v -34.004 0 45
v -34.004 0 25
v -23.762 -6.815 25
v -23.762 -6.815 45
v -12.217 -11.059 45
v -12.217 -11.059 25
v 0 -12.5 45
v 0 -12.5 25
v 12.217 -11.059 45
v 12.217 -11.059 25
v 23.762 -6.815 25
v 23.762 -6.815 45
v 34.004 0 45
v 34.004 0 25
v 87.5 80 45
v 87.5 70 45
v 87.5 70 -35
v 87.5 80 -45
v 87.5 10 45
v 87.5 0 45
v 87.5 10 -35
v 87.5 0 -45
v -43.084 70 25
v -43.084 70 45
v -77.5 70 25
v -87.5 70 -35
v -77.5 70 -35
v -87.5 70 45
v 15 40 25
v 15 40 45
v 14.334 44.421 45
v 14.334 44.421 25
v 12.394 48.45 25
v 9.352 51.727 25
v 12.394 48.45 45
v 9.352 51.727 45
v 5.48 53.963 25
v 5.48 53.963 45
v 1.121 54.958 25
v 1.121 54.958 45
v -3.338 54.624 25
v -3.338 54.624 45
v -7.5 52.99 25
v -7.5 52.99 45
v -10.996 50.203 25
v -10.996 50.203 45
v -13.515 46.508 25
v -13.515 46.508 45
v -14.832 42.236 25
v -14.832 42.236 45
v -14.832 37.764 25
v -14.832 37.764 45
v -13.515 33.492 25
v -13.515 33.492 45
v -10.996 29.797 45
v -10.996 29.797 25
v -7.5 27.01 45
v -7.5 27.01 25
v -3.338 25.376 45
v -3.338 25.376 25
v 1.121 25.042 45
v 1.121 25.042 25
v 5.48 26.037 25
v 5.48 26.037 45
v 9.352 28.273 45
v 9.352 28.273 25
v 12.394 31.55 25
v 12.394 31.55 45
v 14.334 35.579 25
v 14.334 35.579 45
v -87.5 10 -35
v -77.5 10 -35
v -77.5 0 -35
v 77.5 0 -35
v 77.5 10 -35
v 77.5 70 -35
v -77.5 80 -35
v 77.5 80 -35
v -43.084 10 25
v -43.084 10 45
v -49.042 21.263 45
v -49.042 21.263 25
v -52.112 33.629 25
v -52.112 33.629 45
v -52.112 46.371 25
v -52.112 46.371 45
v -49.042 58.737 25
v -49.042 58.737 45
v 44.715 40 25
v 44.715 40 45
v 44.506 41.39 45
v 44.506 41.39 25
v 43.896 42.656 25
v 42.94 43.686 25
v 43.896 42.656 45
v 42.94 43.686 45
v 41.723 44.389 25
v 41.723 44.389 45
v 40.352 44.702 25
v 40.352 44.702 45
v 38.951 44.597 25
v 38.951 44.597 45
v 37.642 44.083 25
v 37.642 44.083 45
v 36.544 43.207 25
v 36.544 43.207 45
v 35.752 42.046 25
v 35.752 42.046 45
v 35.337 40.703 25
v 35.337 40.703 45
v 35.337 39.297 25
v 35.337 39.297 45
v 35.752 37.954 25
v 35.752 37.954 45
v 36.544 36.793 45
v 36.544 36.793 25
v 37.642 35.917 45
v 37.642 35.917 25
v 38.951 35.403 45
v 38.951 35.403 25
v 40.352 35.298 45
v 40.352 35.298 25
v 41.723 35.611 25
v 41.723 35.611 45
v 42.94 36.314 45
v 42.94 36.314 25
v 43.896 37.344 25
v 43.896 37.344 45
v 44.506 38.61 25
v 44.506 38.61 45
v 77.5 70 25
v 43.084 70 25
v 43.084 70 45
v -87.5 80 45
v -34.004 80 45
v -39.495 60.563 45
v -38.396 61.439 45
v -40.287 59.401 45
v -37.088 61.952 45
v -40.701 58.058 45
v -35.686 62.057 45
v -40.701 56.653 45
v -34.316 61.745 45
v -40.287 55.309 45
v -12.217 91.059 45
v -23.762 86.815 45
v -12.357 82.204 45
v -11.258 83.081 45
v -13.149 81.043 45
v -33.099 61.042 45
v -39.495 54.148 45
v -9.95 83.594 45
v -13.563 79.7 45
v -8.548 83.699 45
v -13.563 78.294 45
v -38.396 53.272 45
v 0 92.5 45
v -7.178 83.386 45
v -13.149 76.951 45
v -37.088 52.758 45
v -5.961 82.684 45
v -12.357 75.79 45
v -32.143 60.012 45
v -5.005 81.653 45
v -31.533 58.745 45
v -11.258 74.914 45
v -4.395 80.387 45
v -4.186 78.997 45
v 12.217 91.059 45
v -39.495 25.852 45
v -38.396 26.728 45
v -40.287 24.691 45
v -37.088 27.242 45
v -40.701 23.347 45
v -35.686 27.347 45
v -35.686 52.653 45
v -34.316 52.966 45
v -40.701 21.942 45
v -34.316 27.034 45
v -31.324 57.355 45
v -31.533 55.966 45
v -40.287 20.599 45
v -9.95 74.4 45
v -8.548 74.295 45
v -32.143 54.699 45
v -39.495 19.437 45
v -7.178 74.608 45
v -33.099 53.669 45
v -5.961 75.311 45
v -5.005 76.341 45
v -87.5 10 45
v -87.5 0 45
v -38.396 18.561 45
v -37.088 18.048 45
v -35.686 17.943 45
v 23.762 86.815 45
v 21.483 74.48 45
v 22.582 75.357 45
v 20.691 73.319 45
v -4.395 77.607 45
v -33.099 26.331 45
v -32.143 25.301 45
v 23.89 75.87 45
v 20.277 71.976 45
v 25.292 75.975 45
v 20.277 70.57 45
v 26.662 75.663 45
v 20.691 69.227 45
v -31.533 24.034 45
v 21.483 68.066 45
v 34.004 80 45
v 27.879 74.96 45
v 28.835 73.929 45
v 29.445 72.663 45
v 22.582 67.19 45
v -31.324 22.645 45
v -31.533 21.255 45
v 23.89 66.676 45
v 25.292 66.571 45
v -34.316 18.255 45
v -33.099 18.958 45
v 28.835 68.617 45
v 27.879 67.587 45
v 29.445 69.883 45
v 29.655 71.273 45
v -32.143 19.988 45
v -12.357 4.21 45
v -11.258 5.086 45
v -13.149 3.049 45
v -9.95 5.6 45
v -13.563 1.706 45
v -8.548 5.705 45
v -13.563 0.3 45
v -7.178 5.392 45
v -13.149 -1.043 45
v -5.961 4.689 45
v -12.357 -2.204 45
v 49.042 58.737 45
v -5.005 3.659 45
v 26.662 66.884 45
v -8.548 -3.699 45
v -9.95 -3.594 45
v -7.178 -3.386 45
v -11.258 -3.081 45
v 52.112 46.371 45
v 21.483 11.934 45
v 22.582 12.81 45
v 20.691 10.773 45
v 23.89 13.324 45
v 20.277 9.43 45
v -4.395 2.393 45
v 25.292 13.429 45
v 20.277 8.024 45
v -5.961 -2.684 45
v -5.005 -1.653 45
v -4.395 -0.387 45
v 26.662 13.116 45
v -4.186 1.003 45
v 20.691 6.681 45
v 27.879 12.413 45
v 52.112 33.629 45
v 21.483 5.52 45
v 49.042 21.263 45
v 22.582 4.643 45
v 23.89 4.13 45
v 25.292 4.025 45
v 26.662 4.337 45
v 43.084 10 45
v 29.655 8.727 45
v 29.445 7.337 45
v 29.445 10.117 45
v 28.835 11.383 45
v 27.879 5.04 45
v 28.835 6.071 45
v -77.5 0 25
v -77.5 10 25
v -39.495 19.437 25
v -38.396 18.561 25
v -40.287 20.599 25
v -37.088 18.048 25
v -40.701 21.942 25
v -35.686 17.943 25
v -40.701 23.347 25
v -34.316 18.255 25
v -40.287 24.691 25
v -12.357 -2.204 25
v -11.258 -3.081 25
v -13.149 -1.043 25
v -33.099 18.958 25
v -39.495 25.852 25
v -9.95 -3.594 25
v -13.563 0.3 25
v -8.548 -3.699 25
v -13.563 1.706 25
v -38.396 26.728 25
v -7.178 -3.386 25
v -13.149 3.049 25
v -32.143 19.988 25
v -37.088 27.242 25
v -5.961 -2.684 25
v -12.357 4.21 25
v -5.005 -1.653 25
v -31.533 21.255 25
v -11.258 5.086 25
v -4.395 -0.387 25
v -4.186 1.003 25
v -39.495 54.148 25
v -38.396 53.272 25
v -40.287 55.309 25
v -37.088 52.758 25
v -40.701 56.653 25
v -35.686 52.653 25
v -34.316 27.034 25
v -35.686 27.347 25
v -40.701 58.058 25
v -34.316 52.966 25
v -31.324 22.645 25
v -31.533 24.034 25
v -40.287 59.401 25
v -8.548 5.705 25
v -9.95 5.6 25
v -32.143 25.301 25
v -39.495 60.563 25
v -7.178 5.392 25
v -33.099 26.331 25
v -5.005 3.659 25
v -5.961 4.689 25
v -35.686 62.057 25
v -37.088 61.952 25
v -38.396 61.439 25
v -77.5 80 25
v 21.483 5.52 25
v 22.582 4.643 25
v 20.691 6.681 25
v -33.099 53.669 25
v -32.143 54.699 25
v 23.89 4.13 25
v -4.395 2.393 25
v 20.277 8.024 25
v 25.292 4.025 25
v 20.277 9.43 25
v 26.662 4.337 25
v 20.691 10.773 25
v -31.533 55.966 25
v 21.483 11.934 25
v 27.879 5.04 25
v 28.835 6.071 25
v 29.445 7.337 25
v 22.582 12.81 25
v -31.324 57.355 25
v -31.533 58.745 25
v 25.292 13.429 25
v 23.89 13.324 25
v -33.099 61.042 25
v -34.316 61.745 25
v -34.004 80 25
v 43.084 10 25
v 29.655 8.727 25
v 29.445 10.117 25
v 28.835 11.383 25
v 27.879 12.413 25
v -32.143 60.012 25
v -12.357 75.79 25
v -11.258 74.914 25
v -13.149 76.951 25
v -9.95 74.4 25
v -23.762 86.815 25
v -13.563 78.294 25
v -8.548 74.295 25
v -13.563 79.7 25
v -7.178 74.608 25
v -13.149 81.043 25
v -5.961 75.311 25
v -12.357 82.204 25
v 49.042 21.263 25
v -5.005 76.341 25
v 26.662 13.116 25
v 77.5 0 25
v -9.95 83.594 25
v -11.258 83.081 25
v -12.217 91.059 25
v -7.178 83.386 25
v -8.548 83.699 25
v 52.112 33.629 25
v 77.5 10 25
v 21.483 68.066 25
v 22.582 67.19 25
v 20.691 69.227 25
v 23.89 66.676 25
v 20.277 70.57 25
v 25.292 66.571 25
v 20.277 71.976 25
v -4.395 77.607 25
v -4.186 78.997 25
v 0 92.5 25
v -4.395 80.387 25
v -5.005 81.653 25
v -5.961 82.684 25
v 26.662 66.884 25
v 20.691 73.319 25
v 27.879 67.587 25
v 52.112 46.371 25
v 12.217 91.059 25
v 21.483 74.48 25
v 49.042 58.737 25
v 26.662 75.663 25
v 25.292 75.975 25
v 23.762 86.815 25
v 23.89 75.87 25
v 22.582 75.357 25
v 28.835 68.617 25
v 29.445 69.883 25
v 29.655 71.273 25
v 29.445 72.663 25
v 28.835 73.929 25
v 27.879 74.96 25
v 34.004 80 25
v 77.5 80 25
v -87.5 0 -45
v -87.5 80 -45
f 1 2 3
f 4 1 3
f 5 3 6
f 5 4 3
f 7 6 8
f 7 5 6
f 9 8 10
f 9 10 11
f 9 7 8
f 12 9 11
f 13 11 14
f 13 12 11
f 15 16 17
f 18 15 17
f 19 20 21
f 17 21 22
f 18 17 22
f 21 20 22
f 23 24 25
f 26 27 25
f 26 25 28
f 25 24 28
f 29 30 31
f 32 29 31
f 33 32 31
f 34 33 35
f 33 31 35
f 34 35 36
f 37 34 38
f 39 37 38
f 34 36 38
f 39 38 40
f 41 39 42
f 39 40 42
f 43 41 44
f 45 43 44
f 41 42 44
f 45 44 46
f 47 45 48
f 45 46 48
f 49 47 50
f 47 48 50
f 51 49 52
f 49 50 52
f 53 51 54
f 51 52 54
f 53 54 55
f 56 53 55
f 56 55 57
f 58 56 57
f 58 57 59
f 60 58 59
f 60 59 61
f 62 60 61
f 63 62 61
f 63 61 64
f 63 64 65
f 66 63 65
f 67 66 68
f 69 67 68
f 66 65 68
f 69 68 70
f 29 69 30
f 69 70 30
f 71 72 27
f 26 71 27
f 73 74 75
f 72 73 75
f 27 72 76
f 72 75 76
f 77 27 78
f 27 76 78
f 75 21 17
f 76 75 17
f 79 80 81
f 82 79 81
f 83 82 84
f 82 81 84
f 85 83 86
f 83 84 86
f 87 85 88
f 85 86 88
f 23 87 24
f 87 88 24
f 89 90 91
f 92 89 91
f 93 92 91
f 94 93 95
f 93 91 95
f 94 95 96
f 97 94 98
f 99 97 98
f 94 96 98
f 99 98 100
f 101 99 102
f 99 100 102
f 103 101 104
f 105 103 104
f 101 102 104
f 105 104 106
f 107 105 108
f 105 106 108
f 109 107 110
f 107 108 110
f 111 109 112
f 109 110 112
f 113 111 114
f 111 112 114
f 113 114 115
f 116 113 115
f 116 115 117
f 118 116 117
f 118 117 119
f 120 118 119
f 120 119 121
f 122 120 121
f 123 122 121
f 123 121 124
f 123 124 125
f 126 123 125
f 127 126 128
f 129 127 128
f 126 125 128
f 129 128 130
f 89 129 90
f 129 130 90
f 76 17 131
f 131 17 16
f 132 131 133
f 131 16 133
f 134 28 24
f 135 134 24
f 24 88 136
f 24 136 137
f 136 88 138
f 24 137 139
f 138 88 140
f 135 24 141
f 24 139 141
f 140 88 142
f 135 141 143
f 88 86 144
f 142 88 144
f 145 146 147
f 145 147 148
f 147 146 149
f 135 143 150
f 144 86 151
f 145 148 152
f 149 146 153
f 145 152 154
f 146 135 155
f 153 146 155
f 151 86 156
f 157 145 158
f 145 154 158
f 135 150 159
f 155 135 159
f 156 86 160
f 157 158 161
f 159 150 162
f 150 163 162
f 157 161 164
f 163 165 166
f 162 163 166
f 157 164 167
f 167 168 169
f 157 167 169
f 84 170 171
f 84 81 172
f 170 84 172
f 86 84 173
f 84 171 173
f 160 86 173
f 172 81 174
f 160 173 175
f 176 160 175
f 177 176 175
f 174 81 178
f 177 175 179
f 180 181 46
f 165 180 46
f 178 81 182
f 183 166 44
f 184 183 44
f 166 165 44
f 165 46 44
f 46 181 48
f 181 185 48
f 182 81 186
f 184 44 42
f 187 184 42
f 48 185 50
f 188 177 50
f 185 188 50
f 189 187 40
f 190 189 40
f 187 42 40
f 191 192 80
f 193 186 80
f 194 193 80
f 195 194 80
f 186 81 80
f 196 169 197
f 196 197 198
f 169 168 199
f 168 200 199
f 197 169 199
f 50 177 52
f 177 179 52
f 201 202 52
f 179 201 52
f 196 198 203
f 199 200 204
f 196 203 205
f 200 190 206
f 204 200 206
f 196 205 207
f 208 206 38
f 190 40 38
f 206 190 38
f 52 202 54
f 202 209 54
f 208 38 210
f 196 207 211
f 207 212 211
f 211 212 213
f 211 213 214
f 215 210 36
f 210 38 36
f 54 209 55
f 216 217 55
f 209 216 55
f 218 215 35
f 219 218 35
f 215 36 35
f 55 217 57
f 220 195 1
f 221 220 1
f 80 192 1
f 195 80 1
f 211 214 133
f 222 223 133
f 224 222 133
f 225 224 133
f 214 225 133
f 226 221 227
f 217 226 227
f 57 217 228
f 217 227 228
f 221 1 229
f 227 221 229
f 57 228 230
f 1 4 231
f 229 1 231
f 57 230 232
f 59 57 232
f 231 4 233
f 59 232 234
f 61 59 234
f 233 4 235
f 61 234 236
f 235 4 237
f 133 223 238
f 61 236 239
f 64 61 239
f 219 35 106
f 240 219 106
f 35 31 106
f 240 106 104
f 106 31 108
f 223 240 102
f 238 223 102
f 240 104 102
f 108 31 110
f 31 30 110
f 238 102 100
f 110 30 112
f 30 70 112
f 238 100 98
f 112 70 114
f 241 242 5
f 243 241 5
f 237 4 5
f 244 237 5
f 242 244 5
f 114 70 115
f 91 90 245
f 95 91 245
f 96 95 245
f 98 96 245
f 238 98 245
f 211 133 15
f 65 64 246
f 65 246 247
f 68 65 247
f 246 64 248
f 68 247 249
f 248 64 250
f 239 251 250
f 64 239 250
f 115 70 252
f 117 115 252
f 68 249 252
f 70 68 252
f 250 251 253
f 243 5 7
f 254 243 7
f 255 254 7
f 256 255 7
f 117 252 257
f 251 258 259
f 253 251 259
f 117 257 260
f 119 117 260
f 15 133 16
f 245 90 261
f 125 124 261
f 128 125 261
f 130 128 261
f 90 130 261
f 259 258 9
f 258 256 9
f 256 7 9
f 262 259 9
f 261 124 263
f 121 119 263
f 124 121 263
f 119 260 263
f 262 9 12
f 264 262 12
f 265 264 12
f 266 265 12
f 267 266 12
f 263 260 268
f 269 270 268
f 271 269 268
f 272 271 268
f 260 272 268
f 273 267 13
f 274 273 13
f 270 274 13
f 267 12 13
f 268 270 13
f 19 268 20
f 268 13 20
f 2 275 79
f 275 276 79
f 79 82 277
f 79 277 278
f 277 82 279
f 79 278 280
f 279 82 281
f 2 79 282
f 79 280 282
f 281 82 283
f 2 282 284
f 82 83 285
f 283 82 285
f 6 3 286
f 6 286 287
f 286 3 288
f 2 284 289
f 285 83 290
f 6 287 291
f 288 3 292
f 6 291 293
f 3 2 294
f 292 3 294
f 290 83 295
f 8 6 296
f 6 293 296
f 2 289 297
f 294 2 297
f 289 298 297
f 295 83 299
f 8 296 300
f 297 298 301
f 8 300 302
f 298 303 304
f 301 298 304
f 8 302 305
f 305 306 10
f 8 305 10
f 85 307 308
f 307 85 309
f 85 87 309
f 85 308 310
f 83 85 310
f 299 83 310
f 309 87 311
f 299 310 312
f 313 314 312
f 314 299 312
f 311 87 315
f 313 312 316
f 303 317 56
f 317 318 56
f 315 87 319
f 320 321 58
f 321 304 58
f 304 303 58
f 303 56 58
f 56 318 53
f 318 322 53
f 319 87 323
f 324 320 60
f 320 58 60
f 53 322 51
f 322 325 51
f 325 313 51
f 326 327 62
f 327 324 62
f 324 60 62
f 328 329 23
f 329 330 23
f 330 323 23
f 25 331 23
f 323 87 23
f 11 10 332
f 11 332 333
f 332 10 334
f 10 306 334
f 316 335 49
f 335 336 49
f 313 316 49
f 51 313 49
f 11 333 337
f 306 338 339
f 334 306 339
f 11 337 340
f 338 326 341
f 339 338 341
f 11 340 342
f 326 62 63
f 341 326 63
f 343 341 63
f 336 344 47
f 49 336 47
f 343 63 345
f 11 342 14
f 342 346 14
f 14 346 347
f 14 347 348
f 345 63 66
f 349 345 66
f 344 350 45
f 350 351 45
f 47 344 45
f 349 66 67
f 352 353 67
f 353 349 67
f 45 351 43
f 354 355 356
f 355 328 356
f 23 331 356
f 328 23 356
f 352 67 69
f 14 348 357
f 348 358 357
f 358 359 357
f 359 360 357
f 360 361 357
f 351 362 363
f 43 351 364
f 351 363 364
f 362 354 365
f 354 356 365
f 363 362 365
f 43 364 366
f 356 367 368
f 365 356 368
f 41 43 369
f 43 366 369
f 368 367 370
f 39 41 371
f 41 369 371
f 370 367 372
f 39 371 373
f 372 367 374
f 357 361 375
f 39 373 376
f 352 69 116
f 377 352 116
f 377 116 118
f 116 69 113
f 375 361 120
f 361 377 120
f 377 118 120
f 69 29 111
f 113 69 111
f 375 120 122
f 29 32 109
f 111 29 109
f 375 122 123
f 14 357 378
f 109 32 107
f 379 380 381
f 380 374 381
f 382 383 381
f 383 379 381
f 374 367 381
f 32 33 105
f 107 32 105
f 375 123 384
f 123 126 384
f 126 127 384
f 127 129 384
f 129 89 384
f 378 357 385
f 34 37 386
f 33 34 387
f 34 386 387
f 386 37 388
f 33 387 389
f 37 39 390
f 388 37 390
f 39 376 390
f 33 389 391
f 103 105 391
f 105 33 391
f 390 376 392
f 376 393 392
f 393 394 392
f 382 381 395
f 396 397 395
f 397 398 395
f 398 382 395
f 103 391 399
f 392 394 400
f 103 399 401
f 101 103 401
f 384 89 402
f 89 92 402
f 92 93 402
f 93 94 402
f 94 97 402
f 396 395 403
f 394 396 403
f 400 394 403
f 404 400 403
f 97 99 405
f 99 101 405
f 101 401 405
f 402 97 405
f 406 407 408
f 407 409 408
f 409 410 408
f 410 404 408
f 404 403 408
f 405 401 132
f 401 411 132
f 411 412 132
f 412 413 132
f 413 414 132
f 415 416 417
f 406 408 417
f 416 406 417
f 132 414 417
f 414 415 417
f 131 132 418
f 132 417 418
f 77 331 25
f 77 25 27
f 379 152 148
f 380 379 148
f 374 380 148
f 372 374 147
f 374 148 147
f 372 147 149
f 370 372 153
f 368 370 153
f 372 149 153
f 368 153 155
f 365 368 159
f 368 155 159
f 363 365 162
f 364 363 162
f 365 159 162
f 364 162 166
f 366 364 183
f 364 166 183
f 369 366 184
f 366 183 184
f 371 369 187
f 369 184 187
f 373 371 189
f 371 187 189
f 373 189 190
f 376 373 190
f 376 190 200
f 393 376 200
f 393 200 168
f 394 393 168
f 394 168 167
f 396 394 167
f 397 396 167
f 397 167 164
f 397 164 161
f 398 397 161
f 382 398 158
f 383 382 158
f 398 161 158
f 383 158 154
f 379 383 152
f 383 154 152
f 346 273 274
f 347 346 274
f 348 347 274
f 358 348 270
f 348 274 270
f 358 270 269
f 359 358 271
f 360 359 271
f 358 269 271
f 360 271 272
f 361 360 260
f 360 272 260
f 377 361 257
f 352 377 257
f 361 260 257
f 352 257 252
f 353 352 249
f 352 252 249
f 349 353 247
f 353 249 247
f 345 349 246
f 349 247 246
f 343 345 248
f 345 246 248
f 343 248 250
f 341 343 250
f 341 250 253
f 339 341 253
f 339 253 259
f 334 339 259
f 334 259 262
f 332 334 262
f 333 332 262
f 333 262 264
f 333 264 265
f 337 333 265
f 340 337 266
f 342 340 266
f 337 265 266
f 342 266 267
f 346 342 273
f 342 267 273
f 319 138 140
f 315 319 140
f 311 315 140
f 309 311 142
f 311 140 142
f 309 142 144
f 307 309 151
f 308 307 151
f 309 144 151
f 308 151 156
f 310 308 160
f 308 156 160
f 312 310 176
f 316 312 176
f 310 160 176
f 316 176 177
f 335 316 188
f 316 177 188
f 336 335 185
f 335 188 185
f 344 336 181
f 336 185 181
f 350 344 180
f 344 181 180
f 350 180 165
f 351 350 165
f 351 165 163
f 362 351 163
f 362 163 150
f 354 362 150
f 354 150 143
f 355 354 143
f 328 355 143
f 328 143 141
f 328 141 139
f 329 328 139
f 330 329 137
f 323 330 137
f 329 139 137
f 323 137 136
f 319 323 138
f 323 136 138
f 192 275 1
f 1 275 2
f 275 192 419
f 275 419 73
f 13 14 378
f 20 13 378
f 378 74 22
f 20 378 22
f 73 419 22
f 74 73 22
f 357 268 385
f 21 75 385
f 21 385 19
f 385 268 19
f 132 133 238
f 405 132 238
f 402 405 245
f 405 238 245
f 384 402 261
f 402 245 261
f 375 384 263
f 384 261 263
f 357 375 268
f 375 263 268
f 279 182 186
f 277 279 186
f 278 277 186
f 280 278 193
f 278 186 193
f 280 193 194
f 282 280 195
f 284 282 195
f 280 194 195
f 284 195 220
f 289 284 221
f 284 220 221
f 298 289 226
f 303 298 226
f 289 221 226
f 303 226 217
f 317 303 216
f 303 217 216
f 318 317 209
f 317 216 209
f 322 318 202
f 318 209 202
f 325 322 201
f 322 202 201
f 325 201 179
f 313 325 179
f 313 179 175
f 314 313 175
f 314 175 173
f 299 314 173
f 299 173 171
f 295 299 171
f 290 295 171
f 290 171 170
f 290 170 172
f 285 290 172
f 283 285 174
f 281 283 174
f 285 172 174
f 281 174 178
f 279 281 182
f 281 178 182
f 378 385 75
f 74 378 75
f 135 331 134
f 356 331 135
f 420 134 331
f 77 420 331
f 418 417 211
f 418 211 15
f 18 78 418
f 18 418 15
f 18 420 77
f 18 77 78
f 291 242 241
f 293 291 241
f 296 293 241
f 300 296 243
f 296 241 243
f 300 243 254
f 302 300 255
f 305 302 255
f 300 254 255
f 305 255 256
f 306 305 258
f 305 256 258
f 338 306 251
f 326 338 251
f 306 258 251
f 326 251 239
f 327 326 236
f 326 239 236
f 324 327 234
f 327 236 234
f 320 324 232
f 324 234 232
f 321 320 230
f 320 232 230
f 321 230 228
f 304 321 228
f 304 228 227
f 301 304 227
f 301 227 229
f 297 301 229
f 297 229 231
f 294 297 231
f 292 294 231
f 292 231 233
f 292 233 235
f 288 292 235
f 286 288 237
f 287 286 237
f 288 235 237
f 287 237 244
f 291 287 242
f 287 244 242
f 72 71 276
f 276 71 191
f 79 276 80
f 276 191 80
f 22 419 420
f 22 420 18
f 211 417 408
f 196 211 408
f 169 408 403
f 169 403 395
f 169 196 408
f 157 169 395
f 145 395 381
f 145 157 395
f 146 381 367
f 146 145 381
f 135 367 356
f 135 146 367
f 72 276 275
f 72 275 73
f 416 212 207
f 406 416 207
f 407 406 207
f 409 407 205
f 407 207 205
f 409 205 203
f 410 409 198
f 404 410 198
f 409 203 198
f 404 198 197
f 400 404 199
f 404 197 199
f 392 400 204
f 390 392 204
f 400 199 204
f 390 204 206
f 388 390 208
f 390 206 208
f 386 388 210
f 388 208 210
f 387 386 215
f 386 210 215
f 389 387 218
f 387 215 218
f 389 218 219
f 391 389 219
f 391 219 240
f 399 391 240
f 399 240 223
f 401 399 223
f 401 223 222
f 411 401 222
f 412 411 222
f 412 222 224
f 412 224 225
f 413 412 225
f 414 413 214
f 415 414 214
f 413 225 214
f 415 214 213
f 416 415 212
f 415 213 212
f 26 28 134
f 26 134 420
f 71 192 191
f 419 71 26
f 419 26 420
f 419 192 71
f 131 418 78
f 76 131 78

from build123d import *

# Parameters (mm, degrees)
SKETCH1_W           = 175
SKETCH1_H           = 90
BOSS_EXTRUDE1_DEPTH = 80
SKETCH2_W           = 155
SKETCH2_H           = 60
CUT_EXTRUDE1_DEPTH  = 80
SKETCH3_W           = 60
SKETCH3_H           = 60
CUT_EXTRUDE2_DEPTH  = 176
SKETCH4_R           = 52.5
BOSS_EXTRUDE3_DEPTH = 20
CUT_EXTRUDE3_DEPTH  = 20
SKETCH6_R           = 4.715207805
CUT_EXTRUDE4_DEPTH  = 20
CIRPATTERN1_COUNT   = 7
SKETCH7_R           = 15
CUT_EXTRUDE5_DEPTH  = 20


with BuildPart() as part:
    # Sketch1 → Boss-Extrude1 (new body)
    with BuildSketch(Plane(origin=(0, 0, 0), x_dir=(1, 0, 0), z_dir=(0, 1, 0))):
        Rectangle(SKETCH1_W, SKETCH1_H)
    extrude(amount=BOSS_EXTRUDE1_DEPTH)

    # Sketch2 → Cut-Extrude1 (cut)
    with BuildSketch(Plane(origin=(0, 80, 0), x_dir=(1, 0, 0), z_dir=(0, 1, 0))):
        with Locations((0, 5)):
            Rectangle(SKETCH2_W, SKETCH2_H)
    extrude(amount=-CUT_EXTRUDE1_DEPTH, mode=Mode.SUBTRACT)

    # Sketch3 → Cut-Extrude2 (cut, through all)
    with BuildSketch(Plane(origin=(87.5, 0, 0), x_dir=(0, 0, -1), z_dir=(1, 0, 0))):
        with Locations((5, 40)):
            Rectangle(SKETCH3_W, SKETCH3_H)
    extrude(amount=-CUT_EXTRUDE2_DEPTH, mode=Mode.SUBTRACT)

    # Sketch4 → Boss-Extrude3 (add)
    with BuildSketch(Plane.XY.offset(45)):
        with Locations((0, 40)):
            Circle(SKETCH4_R)
    extrude(amount=-BOSS_EXTRUDE3_DEPTH)

    # Sketch5 → Cut-Extrude3 (cut)
    with BuildSketch(Plane.XY.offset(45)):
        with BuildLine():
            Line((87.5, 70), (43.084219849, 70))
            ThreePointArc((43.084219849, 70), (52.5, 40), (43.084219849, 10))
            Line((43.084219849, 10), (87.5, 10))
            Line((87.5, 10), (87.5, 70))
        make_face()
        with BuildLine():
            Line((-43.084219849, 70), (-87.5, 70))
            Line((-87.5, 70), (-87.5, 10))
            Line((-87.5, 10), (-43.084219849, 10))
            ThreePointArc((-43.084219849, 10), (-52.5, 40), (-43.084219849, 70))
        make_face()
    extrude(amount=-CUT_EXTRUDE3_DEPTH, mode=Mode.SUBTRACT)

    # Sketch6 → Cut-Extrude4 (cut)
    with BuildSketch(Plane.XY.offset(45)):
        with Locations((40, 40)):
            Circle(SKETCH6_R)
    cut_extrude4 = extrude(amount=-CUT_EXTRUDE4_DEPTH, mode=Mode.SUBTRACT)

    # CirPattern1: Cut-Extrude4 ×7 about axis
    cirpattern1_axis = Axis((0, 40, 0), (0, 0, 1))
    for i in range(1, CIRPATTERN1_COUNT):
        add(cut_extrude4.rotate(cirpattern1_axis, i * 360 / CIRPATTERN1_COUNT), mode=Mode.SUBTRACT)

    # Sketch7 → Cut-Extrude5 (cut)
    with BuildSketch(Plane.XY.offset(45)):
        with Locations((0, 40)):
            Circle(SKETCH7_R)
    extrude(amount=-CUT_EXTRUDE5_DEPTH, mode=Mode.SUBTRACT)


solid = part.part
